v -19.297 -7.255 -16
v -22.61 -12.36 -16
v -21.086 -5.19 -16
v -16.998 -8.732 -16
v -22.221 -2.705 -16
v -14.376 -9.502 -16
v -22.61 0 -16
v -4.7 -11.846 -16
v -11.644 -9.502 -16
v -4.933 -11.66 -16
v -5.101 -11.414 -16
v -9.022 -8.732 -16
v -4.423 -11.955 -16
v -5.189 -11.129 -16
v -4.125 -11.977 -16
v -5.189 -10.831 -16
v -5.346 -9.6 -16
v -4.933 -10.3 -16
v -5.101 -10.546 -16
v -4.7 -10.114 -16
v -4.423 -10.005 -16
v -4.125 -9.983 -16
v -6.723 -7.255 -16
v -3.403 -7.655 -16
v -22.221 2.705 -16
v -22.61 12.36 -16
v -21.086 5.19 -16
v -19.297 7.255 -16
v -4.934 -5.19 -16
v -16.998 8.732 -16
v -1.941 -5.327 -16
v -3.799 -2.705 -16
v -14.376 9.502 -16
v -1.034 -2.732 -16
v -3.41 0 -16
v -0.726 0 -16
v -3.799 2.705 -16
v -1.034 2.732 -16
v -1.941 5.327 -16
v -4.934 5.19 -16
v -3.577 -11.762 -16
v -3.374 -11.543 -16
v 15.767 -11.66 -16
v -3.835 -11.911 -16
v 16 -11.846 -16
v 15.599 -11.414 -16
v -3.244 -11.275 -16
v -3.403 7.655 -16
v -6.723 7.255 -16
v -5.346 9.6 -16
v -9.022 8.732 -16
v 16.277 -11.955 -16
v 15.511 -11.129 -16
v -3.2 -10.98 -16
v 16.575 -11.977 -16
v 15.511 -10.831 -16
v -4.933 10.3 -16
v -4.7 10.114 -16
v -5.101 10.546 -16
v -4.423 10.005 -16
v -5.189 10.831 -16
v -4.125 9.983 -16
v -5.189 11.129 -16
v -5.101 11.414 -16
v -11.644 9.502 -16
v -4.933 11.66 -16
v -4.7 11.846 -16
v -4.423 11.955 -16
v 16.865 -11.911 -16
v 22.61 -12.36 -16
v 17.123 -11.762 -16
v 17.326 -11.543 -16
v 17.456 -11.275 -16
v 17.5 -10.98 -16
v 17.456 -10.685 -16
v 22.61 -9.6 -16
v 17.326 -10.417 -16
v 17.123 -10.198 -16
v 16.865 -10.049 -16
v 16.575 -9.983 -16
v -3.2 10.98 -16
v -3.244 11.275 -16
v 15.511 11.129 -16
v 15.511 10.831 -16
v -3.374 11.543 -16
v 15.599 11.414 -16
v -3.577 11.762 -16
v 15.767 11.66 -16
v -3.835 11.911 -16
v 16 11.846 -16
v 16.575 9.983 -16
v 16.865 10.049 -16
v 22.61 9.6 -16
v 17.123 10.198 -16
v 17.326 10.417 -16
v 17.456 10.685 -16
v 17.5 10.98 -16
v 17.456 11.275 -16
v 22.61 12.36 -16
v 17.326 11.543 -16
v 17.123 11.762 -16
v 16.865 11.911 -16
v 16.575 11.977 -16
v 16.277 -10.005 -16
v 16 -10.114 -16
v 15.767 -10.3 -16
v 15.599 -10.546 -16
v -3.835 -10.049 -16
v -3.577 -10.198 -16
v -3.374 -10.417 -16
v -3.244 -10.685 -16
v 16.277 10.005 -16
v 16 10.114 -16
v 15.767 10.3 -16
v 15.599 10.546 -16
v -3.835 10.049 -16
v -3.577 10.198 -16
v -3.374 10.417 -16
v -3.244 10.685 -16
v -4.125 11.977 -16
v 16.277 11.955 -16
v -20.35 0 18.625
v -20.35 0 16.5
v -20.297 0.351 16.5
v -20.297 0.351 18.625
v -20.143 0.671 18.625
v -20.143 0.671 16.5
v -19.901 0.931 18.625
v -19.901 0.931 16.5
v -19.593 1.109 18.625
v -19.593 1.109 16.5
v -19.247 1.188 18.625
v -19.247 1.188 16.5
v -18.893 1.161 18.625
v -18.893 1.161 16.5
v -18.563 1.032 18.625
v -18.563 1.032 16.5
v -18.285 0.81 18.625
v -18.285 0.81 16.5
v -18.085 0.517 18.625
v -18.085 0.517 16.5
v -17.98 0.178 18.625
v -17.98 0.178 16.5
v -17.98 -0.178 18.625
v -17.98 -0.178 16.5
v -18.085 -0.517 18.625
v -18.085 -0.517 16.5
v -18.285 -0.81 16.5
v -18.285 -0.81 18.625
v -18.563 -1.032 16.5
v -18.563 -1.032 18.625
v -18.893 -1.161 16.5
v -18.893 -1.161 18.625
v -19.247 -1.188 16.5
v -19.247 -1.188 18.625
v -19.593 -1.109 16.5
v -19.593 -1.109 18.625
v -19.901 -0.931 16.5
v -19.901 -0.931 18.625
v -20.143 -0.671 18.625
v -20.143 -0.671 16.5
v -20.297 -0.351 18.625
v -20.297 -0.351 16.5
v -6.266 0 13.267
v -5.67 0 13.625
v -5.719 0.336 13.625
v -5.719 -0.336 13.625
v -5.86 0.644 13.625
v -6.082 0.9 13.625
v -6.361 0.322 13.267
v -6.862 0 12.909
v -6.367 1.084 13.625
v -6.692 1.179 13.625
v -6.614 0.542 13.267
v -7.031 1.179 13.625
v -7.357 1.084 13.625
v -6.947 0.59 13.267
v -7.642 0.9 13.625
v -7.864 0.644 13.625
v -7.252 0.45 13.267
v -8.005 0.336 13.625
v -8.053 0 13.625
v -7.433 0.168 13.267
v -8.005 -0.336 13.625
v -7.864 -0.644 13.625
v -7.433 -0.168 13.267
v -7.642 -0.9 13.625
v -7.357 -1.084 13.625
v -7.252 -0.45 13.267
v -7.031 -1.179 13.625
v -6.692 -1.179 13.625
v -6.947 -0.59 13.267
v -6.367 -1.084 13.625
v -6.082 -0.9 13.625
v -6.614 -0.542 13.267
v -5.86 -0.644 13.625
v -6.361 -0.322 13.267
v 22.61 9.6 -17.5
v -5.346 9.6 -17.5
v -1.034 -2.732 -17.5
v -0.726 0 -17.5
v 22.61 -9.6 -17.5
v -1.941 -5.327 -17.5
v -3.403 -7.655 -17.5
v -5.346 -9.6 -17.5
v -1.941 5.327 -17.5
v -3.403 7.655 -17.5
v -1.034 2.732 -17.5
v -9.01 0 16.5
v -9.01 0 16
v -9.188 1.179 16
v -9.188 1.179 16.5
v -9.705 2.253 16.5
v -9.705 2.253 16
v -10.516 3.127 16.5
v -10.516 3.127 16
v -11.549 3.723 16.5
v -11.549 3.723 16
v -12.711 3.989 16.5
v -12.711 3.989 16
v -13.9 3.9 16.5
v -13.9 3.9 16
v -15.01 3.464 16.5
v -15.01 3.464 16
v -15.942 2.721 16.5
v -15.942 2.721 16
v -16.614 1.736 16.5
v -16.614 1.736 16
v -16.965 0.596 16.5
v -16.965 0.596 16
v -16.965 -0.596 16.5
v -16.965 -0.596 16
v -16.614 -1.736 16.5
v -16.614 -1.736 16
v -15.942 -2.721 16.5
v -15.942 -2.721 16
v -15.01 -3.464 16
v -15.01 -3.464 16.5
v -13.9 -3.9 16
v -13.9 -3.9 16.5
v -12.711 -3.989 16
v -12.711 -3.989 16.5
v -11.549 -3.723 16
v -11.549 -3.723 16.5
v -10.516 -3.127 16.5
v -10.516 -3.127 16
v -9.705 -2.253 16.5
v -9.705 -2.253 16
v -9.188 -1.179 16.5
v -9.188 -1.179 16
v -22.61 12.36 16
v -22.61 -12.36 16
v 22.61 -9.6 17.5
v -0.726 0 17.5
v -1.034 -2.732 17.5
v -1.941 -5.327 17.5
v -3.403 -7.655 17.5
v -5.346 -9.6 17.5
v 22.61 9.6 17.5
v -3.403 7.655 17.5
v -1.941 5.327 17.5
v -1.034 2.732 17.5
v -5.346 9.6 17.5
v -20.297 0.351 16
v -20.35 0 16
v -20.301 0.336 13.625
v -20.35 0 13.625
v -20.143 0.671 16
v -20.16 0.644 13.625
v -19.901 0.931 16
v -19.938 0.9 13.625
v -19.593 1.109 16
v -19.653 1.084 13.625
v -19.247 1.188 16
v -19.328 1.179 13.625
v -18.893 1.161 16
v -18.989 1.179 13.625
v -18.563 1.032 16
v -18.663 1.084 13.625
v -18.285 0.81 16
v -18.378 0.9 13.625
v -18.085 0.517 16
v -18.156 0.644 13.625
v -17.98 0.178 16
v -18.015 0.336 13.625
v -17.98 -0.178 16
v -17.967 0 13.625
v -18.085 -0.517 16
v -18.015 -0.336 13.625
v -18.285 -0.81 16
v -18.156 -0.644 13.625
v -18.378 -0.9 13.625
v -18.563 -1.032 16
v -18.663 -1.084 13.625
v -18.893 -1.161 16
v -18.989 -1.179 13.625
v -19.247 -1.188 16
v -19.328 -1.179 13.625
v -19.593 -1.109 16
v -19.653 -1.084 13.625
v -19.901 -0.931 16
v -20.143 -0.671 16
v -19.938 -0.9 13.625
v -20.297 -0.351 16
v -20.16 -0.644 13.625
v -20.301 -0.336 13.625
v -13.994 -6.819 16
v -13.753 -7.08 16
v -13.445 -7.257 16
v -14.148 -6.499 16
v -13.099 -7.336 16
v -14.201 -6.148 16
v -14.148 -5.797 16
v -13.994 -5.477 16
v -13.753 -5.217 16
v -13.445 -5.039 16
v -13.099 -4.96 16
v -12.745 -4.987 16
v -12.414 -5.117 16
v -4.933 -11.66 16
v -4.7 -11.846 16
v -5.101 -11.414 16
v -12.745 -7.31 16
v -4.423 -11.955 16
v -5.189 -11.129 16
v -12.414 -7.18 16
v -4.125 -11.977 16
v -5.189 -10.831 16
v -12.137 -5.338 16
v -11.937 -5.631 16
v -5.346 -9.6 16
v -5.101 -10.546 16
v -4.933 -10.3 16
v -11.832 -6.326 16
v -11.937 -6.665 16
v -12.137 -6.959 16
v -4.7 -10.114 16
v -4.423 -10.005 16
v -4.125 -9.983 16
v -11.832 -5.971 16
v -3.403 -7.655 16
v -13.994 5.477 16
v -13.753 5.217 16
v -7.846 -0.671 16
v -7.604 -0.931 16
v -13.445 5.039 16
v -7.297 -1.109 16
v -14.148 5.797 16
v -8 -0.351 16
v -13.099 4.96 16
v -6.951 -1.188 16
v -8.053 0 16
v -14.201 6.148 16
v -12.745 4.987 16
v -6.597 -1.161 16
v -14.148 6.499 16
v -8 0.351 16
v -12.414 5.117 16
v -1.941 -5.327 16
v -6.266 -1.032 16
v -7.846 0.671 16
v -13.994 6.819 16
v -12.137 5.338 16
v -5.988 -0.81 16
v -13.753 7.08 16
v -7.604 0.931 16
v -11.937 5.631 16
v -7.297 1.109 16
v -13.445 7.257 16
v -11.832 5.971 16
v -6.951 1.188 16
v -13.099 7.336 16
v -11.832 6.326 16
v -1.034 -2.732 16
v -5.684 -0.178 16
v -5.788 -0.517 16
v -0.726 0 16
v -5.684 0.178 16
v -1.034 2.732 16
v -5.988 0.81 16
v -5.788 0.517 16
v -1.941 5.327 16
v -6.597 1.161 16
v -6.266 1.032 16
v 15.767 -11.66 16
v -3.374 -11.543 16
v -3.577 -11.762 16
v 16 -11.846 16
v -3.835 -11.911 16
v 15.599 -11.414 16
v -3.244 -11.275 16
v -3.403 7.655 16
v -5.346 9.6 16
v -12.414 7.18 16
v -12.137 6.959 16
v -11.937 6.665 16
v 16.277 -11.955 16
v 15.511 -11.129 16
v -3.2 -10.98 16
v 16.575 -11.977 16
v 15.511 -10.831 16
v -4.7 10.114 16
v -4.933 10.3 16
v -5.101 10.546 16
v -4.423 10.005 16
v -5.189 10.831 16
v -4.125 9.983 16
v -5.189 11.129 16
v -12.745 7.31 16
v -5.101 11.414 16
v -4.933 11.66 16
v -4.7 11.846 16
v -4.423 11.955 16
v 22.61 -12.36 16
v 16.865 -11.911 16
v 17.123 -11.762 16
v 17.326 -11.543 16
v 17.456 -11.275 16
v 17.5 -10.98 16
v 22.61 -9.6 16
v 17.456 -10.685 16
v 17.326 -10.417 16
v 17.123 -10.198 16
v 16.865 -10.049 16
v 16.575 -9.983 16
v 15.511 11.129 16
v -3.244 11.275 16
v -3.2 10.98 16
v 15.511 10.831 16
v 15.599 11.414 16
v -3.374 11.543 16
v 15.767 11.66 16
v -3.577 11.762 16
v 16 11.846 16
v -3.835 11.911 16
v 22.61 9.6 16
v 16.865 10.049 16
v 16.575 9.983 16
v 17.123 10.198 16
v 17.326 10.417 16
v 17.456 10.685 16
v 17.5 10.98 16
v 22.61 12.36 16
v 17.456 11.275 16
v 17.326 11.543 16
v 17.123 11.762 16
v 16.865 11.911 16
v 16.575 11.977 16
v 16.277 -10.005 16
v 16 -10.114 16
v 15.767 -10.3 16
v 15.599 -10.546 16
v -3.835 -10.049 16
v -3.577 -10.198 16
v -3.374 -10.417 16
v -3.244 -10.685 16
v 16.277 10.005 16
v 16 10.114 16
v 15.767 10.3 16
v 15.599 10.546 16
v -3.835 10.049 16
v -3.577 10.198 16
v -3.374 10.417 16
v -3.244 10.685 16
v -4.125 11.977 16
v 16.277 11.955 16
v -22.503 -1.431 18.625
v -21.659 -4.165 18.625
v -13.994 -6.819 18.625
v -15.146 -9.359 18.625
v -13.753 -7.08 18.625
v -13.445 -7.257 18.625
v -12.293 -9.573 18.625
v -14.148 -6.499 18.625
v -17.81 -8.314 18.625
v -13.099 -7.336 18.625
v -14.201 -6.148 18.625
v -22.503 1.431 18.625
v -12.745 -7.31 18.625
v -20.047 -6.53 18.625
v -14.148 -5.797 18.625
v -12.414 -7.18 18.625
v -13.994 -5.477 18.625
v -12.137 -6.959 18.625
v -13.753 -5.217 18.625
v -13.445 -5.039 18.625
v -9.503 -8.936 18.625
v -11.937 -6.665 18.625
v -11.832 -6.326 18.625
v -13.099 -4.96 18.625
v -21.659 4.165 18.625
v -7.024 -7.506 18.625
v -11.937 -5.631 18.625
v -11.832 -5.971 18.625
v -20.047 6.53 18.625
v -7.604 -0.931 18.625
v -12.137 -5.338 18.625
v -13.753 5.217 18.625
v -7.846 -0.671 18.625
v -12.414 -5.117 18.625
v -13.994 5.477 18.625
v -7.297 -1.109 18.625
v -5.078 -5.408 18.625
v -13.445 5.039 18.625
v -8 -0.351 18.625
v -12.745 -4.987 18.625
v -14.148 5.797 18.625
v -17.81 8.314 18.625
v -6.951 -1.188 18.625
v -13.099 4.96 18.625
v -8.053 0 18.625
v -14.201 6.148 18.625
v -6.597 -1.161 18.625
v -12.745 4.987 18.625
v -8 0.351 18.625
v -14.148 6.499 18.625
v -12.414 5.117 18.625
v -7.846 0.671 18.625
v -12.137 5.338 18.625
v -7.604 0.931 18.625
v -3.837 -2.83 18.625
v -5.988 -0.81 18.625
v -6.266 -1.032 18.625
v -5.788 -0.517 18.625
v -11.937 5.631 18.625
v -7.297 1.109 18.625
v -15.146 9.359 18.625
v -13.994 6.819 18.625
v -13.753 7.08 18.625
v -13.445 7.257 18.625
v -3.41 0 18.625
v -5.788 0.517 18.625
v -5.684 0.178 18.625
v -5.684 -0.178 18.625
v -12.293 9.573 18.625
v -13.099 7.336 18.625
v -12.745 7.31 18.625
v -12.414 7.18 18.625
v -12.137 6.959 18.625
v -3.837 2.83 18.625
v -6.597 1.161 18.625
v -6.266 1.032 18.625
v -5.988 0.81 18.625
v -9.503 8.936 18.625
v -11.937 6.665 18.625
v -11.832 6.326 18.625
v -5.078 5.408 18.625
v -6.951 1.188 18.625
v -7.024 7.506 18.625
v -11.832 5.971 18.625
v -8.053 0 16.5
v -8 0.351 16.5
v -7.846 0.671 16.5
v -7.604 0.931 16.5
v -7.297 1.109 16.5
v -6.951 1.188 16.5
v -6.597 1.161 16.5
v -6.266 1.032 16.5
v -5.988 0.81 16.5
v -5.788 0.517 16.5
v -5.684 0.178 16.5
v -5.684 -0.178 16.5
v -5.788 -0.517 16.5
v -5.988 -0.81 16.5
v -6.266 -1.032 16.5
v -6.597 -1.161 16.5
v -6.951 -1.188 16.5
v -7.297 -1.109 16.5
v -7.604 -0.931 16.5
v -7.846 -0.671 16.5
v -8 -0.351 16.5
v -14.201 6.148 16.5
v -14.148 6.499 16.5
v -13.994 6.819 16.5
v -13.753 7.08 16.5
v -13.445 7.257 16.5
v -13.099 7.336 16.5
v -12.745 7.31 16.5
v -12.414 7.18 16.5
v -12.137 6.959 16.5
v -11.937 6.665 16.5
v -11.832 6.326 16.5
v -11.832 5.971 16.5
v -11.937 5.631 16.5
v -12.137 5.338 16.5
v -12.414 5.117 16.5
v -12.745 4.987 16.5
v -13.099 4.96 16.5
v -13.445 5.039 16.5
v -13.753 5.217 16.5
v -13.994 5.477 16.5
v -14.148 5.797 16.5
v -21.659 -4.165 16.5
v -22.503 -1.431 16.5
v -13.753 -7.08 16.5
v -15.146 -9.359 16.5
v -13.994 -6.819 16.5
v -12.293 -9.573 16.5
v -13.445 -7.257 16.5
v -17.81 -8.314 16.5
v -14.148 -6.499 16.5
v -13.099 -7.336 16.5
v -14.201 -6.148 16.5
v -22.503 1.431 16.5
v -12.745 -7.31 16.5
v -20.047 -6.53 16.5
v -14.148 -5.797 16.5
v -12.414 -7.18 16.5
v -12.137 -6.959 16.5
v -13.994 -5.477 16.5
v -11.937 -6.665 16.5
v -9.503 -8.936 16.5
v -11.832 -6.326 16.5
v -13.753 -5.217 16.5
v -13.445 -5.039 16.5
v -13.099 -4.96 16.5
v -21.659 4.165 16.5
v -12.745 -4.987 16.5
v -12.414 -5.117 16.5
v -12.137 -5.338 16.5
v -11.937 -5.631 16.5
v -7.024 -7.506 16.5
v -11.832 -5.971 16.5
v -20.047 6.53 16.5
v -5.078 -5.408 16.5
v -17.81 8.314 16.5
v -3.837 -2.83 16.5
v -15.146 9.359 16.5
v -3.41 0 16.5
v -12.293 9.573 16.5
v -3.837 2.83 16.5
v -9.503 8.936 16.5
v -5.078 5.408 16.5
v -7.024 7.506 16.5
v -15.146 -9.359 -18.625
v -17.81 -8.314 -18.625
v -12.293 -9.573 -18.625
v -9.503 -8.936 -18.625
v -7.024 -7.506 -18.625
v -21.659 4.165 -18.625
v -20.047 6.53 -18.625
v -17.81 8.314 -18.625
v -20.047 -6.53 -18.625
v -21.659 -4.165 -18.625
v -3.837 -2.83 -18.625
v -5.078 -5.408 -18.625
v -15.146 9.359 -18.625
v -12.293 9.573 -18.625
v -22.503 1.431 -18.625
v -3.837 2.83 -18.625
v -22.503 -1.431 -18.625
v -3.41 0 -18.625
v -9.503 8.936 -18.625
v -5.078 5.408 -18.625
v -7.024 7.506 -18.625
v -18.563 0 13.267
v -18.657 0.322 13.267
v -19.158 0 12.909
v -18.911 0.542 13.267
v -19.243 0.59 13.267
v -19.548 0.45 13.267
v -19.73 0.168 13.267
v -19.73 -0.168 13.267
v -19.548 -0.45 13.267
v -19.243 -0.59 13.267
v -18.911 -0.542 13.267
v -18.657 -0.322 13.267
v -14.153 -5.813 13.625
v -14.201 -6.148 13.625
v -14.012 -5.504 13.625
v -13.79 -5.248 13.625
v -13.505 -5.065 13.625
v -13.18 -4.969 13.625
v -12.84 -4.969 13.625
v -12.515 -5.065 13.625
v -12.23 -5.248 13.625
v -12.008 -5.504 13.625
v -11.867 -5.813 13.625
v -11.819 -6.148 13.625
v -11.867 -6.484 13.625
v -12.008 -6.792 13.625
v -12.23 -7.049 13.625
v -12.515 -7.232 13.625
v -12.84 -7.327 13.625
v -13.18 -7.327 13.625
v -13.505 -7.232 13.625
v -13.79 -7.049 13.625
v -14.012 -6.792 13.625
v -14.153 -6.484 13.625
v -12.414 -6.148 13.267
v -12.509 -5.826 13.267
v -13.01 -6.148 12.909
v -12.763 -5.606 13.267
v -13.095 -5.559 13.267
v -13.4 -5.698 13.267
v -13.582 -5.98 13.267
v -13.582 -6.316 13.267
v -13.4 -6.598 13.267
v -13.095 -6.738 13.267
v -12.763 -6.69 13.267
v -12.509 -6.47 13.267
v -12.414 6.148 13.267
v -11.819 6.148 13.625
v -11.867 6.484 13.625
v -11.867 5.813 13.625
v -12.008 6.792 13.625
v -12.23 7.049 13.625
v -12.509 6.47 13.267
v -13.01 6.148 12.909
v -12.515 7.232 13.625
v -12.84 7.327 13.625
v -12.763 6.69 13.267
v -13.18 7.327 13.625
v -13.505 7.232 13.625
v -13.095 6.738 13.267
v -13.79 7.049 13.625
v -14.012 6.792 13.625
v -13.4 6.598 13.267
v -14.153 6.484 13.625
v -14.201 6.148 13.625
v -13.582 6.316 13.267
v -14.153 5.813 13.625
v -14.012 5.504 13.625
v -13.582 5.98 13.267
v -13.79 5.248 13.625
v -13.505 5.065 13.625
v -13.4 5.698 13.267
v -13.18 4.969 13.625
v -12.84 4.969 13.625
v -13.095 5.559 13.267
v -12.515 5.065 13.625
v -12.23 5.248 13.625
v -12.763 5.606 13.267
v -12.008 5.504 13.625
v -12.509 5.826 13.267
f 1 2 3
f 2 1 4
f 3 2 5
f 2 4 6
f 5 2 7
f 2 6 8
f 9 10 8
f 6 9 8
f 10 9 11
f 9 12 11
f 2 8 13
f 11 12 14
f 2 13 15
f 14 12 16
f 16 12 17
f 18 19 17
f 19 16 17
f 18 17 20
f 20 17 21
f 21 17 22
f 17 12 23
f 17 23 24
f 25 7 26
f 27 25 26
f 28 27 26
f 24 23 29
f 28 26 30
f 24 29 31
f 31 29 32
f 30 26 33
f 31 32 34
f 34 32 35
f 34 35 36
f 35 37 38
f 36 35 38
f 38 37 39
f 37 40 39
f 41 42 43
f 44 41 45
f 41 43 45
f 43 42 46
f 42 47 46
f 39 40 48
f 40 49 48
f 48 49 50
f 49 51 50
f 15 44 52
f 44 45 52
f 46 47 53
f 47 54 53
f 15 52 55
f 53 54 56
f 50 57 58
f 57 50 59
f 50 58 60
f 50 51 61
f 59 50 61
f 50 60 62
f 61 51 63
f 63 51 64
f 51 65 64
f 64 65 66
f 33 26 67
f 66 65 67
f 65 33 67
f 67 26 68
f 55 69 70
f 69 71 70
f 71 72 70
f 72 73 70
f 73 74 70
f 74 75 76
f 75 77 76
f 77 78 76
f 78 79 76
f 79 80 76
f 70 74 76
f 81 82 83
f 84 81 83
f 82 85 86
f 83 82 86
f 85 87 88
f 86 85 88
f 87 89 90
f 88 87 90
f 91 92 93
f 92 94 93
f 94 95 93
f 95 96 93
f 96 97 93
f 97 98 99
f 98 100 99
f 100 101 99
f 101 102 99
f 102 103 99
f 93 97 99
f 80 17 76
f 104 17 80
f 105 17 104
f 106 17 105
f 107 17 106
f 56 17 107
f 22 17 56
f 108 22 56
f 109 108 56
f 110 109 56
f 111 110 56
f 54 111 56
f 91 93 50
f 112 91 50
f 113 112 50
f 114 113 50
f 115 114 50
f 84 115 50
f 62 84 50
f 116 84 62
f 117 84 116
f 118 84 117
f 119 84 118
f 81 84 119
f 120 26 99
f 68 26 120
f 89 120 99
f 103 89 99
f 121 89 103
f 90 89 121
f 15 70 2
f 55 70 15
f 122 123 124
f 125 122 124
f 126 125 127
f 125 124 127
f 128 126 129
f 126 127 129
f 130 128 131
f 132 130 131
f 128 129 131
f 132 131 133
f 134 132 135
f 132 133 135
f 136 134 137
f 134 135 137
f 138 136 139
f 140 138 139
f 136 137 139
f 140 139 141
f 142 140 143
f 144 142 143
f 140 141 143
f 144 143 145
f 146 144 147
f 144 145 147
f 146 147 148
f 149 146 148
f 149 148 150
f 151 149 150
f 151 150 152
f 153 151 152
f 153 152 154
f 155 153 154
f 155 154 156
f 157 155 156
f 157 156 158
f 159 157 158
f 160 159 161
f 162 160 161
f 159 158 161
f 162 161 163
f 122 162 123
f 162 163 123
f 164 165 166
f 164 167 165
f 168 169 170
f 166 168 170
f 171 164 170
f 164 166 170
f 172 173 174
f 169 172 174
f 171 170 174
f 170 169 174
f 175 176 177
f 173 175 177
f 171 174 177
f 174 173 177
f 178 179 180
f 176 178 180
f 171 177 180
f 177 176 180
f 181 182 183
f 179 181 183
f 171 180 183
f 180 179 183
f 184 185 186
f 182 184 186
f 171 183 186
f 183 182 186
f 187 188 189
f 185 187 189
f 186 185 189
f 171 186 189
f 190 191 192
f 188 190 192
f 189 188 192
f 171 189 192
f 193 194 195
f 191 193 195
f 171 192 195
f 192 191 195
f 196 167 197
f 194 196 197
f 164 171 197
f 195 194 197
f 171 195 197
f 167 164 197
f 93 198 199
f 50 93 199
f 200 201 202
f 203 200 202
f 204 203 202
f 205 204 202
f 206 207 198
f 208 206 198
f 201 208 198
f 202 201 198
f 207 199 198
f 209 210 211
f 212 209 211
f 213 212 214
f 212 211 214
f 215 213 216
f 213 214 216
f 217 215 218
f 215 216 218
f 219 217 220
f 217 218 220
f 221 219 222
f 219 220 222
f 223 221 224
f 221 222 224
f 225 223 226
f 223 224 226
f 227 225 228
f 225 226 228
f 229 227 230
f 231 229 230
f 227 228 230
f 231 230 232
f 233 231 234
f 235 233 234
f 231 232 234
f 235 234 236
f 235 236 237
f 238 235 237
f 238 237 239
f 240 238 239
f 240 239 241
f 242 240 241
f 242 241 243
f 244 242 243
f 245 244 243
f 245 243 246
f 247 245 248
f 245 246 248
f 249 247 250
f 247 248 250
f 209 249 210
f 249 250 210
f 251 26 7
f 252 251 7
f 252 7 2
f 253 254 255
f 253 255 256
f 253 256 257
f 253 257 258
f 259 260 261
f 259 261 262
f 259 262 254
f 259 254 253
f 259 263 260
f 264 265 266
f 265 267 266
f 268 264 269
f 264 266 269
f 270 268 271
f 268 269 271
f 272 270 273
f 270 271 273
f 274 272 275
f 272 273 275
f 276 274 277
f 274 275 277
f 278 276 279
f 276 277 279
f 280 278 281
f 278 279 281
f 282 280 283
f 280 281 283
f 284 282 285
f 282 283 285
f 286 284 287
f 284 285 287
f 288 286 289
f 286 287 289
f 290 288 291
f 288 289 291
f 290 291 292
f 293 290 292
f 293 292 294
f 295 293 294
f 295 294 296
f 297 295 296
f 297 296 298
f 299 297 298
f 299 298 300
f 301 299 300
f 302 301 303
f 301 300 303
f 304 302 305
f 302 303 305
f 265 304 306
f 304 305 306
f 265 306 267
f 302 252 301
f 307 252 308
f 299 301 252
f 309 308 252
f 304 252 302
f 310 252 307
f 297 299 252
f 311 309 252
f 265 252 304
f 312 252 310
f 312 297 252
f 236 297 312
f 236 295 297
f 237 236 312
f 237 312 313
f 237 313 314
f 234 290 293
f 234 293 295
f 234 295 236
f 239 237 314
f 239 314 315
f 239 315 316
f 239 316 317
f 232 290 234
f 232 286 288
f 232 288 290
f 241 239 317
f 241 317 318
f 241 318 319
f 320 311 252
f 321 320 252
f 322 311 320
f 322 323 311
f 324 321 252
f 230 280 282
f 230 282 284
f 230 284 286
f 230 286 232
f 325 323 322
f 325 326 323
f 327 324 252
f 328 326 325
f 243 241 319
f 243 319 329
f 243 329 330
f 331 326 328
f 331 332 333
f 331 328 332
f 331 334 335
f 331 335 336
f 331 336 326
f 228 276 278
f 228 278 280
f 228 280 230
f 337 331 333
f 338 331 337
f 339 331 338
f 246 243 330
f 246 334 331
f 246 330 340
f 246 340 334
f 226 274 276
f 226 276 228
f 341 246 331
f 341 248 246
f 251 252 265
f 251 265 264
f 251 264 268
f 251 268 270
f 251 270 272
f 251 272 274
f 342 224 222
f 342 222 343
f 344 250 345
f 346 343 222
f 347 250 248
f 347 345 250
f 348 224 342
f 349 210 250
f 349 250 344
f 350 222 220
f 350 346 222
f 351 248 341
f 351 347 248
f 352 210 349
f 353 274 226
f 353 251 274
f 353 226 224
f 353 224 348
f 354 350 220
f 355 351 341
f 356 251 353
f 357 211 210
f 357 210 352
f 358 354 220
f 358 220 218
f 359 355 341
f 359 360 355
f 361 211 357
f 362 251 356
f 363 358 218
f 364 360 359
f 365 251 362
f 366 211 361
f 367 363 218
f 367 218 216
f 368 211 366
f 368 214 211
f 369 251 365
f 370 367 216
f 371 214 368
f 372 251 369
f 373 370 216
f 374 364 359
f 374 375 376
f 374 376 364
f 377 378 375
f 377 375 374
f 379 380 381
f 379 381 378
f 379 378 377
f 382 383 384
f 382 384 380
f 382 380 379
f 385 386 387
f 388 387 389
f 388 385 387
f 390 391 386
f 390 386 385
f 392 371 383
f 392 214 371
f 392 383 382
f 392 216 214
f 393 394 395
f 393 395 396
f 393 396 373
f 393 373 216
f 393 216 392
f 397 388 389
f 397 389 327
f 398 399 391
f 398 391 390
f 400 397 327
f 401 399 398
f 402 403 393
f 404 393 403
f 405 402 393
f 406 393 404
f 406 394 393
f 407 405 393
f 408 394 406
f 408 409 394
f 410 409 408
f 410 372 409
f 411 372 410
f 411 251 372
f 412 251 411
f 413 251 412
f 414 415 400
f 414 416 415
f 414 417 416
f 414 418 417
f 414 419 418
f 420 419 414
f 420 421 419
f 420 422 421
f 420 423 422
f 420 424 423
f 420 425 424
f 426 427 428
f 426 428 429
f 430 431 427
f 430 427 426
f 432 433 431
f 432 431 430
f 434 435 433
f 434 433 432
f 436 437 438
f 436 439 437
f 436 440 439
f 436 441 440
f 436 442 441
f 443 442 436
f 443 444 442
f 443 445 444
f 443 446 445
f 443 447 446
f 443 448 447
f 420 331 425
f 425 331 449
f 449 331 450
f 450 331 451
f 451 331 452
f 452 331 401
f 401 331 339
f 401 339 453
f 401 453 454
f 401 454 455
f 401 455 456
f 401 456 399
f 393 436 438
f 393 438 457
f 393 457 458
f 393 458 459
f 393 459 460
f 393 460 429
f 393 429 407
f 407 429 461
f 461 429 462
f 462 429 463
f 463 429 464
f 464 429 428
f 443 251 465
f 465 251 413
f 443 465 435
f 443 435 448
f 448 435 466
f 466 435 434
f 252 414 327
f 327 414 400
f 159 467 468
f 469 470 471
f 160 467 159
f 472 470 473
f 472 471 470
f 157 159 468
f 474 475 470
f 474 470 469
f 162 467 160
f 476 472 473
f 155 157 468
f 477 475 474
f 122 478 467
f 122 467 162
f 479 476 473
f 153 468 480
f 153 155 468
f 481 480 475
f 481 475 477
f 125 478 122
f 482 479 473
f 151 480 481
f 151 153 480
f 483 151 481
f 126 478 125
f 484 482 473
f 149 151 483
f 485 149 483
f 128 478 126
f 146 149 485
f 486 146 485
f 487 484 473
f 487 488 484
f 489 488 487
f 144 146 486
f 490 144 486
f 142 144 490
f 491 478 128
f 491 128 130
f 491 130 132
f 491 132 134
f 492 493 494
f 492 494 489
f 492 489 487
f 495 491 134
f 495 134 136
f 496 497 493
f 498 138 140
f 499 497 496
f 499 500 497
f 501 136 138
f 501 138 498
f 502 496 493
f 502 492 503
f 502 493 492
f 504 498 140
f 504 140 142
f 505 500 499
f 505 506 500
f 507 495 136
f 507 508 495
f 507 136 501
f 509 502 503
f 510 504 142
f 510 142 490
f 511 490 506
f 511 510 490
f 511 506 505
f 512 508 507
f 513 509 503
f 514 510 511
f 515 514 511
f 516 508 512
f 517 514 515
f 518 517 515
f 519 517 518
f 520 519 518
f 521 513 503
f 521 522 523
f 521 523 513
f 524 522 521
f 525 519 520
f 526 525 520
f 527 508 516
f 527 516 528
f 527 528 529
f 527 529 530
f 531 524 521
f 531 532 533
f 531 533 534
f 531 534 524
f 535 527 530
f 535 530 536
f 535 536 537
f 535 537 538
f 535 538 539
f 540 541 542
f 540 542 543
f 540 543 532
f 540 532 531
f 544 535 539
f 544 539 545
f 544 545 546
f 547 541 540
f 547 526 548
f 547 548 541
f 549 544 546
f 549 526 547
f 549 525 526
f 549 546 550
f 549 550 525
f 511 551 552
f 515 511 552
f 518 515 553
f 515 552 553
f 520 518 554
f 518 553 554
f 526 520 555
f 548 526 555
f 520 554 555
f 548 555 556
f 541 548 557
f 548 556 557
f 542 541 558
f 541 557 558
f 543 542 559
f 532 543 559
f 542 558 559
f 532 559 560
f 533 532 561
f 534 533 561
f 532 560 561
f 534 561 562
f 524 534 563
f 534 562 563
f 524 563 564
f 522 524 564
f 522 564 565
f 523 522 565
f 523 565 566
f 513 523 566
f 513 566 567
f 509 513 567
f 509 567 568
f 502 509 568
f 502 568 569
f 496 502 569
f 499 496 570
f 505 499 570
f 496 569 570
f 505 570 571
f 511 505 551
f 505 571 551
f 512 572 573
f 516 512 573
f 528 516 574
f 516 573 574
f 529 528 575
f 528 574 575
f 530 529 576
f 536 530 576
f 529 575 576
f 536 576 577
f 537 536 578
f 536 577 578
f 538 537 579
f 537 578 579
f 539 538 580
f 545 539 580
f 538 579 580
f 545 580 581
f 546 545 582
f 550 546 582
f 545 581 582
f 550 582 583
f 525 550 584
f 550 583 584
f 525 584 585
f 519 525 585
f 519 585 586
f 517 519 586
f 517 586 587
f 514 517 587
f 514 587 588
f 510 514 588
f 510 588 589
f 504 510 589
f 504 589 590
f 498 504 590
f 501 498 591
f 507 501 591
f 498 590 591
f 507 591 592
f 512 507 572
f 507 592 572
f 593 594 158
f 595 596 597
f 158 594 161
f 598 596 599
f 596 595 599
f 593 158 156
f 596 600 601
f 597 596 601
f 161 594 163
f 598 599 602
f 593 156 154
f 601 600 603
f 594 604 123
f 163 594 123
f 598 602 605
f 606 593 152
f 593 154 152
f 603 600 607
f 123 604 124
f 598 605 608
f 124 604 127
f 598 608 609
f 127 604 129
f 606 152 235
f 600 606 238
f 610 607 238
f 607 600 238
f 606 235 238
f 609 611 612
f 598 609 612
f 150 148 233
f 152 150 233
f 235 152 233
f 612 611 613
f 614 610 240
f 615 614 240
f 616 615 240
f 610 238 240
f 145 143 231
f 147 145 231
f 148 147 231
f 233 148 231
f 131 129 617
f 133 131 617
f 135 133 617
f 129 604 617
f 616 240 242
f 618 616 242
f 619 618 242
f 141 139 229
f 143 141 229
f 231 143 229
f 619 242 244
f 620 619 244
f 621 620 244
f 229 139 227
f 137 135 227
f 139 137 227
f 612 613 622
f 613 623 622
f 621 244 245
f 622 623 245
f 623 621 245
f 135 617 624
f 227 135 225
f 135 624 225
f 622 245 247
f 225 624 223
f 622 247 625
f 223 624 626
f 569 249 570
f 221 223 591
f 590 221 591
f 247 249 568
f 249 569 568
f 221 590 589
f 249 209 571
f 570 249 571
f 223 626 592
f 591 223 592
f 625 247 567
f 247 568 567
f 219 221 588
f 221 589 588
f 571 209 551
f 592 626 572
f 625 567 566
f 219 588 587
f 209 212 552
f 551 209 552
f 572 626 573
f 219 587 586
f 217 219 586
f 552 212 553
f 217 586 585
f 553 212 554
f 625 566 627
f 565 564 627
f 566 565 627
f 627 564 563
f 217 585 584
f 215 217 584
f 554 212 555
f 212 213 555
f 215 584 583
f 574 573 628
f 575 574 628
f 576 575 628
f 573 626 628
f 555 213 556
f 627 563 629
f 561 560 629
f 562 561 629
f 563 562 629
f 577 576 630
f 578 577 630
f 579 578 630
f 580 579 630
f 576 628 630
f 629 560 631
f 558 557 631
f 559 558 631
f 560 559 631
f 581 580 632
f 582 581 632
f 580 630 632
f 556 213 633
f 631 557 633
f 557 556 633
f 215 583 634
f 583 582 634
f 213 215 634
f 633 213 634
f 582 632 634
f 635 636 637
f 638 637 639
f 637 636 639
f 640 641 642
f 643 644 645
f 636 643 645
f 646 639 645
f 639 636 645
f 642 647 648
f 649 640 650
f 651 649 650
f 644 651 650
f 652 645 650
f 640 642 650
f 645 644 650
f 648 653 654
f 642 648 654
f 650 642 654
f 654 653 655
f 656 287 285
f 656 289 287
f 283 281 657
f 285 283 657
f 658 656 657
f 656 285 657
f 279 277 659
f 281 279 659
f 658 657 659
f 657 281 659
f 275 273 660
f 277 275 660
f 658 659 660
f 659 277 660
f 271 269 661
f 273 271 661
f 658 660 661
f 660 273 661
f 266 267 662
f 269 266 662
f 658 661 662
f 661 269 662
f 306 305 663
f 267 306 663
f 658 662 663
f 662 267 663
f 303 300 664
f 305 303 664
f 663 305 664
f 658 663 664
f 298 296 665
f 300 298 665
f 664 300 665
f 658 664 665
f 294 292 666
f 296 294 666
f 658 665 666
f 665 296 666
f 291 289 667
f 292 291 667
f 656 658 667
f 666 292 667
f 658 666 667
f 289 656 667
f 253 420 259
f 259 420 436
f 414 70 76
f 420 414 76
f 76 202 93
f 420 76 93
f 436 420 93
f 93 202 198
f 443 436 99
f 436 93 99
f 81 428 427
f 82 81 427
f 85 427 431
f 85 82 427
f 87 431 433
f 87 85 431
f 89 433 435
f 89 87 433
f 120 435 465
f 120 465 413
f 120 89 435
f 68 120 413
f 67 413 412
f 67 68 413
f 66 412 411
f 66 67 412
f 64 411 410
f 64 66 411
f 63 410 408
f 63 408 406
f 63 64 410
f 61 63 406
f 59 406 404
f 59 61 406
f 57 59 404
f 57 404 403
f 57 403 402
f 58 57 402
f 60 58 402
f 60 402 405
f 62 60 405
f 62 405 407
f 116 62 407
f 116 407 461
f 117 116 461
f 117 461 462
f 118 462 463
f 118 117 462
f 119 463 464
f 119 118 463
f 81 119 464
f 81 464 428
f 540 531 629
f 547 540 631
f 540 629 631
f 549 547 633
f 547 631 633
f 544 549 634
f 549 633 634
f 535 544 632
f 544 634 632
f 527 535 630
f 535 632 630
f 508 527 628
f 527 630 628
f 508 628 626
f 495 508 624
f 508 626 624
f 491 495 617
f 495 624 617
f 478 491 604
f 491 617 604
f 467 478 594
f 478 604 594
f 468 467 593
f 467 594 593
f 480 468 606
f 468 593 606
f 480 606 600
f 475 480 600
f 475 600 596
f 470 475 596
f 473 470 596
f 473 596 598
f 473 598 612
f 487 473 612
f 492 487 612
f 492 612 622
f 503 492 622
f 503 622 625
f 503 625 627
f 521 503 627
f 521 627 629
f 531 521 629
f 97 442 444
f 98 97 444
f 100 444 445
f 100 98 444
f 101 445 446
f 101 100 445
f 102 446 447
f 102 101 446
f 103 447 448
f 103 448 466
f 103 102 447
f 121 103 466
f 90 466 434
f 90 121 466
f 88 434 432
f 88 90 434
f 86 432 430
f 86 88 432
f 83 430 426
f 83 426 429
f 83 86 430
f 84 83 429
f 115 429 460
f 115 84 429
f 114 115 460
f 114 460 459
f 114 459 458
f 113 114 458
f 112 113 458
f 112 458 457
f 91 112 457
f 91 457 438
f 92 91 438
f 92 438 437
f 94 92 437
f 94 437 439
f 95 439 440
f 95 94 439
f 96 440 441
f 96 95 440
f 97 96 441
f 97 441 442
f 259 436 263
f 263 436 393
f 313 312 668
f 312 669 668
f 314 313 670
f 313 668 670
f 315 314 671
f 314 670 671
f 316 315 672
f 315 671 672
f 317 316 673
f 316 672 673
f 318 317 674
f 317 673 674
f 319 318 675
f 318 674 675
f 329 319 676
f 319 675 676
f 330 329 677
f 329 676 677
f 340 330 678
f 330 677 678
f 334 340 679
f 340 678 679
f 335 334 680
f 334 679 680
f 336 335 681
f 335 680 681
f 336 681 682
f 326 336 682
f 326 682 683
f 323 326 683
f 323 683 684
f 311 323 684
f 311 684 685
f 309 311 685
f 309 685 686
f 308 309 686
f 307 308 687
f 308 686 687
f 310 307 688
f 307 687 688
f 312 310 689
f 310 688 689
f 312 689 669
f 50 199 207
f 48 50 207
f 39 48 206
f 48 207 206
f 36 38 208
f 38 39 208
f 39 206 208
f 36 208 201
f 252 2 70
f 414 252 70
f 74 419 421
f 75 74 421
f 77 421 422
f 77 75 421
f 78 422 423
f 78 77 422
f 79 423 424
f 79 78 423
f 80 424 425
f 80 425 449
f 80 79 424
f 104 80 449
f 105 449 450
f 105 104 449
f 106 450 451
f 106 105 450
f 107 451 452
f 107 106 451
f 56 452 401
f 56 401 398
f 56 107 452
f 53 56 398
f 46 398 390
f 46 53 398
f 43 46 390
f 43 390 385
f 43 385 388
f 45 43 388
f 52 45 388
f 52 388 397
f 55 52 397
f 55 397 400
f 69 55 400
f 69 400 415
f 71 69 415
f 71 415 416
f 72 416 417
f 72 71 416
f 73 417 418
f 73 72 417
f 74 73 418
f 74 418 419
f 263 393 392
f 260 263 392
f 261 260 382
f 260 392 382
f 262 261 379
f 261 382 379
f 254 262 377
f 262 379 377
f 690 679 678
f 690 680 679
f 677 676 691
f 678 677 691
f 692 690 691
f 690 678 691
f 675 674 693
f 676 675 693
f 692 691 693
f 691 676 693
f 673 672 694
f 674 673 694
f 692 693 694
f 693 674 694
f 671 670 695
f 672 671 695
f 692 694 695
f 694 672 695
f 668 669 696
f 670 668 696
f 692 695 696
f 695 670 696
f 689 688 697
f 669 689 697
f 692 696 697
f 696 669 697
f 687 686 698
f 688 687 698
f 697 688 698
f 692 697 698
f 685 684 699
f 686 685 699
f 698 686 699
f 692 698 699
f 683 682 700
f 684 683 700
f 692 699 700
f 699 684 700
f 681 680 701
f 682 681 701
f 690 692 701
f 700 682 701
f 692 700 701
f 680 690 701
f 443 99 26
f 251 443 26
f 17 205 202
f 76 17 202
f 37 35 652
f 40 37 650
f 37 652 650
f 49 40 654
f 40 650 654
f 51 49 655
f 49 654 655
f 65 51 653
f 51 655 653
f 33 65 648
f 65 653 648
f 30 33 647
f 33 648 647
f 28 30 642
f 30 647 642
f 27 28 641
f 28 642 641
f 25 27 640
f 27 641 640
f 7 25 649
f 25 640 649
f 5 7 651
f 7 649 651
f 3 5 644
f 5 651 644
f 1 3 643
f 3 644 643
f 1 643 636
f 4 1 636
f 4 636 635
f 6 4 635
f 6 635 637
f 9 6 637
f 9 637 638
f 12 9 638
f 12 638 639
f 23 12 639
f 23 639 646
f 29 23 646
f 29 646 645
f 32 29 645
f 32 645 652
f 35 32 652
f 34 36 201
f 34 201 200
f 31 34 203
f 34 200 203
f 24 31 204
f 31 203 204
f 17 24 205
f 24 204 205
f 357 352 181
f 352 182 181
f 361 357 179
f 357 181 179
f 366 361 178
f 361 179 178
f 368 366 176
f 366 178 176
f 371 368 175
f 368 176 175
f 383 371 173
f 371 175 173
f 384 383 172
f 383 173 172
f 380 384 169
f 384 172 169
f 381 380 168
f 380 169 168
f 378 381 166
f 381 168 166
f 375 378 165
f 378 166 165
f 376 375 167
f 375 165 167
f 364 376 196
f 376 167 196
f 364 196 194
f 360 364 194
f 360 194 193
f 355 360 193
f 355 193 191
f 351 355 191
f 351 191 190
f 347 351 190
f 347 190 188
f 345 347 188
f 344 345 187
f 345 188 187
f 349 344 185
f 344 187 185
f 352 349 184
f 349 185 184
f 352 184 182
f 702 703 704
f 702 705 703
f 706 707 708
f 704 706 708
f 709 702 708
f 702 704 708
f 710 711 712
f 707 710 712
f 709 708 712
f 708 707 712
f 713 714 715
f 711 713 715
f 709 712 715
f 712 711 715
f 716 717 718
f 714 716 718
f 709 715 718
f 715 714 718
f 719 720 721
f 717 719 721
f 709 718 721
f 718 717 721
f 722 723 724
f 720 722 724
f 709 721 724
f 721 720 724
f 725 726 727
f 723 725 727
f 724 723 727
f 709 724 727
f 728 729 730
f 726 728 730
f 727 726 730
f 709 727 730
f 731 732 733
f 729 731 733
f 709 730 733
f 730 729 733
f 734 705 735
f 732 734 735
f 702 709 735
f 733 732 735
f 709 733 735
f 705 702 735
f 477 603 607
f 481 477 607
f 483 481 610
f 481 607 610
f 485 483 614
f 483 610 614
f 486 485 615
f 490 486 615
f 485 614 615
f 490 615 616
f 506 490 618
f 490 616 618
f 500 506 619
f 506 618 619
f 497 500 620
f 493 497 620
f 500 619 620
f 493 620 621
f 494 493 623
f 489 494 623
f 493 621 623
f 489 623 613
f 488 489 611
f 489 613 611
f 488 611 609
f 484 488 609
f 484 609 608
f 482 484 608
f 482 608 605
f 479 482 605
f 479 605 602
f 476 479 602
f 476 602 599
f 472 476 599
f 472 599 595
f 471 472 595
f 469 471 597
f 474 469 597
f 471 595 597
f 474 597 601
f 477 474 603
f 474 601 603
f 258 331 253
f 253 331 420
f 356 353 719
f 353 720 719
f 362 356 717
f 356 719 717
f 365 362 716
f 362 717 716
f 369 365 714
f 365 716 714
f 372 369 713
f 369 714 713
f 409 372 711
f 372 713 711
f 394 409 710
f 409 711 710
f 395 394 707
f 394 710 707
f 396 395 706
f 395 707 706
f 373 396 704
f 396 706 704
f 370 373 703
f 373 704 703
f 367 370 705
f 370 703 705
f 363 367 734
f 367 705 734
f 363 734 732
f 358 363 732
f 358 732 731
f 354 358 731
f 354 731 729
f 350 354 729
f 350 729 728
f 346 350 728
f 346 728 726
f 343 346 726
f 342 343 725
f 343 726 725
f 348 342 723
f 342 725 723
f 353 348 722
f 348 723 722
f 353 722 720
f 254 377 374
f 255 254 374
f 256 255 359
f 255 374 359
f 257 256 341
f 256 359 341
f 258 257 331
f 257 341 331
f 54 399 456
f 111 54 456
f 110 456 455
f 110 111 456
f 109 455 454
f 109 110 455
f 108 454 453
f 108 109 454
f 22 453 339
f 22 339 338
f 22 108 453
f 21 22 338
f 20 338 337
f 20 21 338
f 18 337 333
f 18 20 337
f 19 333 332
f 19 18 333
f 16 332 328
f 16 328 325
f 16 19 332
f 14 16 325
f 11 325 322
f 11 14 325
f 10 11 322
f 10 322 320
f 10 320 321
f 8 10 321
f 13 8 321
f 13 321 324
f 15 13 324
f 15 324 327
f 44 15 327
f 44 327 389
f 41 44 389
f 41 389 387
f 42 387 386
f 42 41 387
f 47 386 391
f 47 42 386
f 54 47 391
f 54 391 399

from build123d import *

# Parameters (mm, degrees)
BOSS_EXTRUDE1_DEPTH             = 17.5
BOSS_EXTRUDE1_DEPTH_BACK        = 17.5
BOSS_EXTRUDE2_DEPTH             = 16
BOSS_EXTRUDE2_DEPTH_BACK        = 16
SKETCH1_3_R                     = 1
SKETCH1_3_W                     = 27.956190476
SKETCH1_3_H                     = 2.76
BOSS_EXTRUDE3_DEPTH             = 18.625
BOSS_EXTRUDE3_DEPTH_BACK        = 18.625
TAP_DRILL_FOR_2_HELICOIL1_D     = 2.38252
TAP_DRILL_FOR_2_HELICOIL1_DEPTH = 5
TAP_DRILL_FOR_2_HELICOIL1_TIP   = 0.715781221
SKETCH6_R                       = 9.6
SKETCH6_R_2                     = 4
CUT_EXTRUDE1_DEPTH              = 0.5


with BuildPart() as part:
    # Sketch1 → Boss-Extrude1 (new, two sides: drawn at the far end of the back side and taken through both)
    with BuildSketch(Plane.XY.offset(-BOSS_EXTRUDE1_DEPTH_BACK)):
        with BuildLine():
            Line((22.61, 0), (-0.726109068, 0))
            ThreePointArc((-0.726109068, 0), (-1.941229139, -5.326939839), (-5.346190476, -9.6))
            Line((-5.346190476, -9.6), (22.61, -9.6))
            Line((22.61, -9.6), (22.61, 0))
        make_face()
        with BuildLine():
            Line((22.61, 9.6), (-5.346190476, 9.6))
            ThreePointArc((-5.346190476, 9.6), (-1.941229139, 5.326939839), (-0.726109068, 0))
            Line((-0.726109068, 0), (22.61, 0))
            Line((22.61, 0), (22.61, 9.6))
        make_face()
    extrude(amount=BOSS_EXTRUDE1_DEPTH + BOSS_EXTRUDE1_DEPTH_BACK)

    # Sketch1<3> → Boss-Extrude2 (add, two sides: drawn at the far end of the back side and taken through both)
    # profile 1 of 7: a face of its own
    with BuildSketch(Plane.XY.offset(-BOSS_EXTRUDE2_DEPTH_BACK)):
        with BuildLine():
            ThreePointArc((-5.346190476, -9.6), (-1.941229139, -5.326939839), (-0.726109068, 0))
            Line((-0.726109068, 0), (-3.41, 0))
            ThreePointArc((-3.41, 0), (-13.01, -9.6), (-22.61, 0))
            Line((-22.61, 0), (-22.61, -12.36))
            Line((-22.61, -12.36), (-5.346190476, -12.36))
            Line((-5.346190476, -12.36), (-5.346190476, -9.6))
        make_face()
    # profile 2 of 7: a face of its own
    with BuildSketch(Plane.XY.offset(-BOSS_EXTRUDE2_DEPTH_BACK)):
        with BuildLine():
            ThreePointArc((-22.61, 0), (-13.01, -9.6), (-3.41, 0))
            Line((-3.41, 0), (-22.61, 0))
        make_face()
    # profile 3 of 7: a face of its own
    with BuildSketch(Plane.XY.offset(-BOSS_EXTRUDE2_DEPTH_BACK)):
        with BuildLine():
            Line((-22.61, 0), (-3.41, 0))
            ThreePointArc((-3.41, 0), (-13.01, 9.6), (-22.61, 0))
        make_face()
    # profile 4 of 7: a face of its own
    with BuildSketch(Plane.XY.offset(-BOSS_EXTRUDE2_DEPTH_BACK)):
        with BuildLine():
            ThreePointArc((-22.61, 0), (-13.01, -9.6), (-3.41, 0))
            Line((-3.41, 0), (-22.61, 0))
        make_face()
    # profile 5 of 7: a face of its own
    with BuildSketch(Plane.XY.offset(-BOSS_EXTRUDE2_DEPTH_BACK)):
        with BuildLine():
            Line((-22.61, 0), (-3.41, 0))
            ThreePointArc((-3.41, 0), (-13.01, 9.6), (-22.61, 0))
        make_face()
    # profile 6 of 7: a face of its own
    with BuildSketch(Plane.XY.offset(-BOSS_EXTRUDE2_DEPTH_BACK)):
        with BuildLine():
            ThreePointArc((-0.726109068, 0), (-1.941229139, 5.326939839), (-5.346190476, 9.6))
            Line((-5.346190476, 9.6), (22.61, 9.6))
            Line((22.61, 9.6), (22.61, 12.36))
            Line((22.61, 12.36), (-22.61, 12.36))
            Line((-22.61, 12.36), (-22.61, 0))
            ThreePointArc((-22.61, 0), (-13.01, 9.6), (-3.41, 0))
            Line((-3.41, 0), (-0.726109068, 0))
        make_face()
        with Locations((-4.2, 10.98)):
            Circle(SKETCH1_3_R, mode=Mode.SUBTRACT)
        with Locations((16.5, 10.98)):
            Circle(SKETCH1_3_R, mode=Mode.SUBTRACT)
    # profile 7 of 7: a face of its own
    with BuildSketch(Plane.XY.offset(-BOSS_EXTRUDE2_DEPTH_BACK)):
        with Locations((8.631904762, -10.98)):
            Rectangle(SKETCH1_3_W, SKETCH1_3_H)
        with Locations((-4.2, -10.98)):
            Circle(SKETCH1_3_R, mode=Mode.SUBTRACT)
        with Locations((16.5, -10.98)):
            Circle(SKETCH1_3_R, mode=Mode.SUBTRACT)
    extrude(amount=BOSS_EXTRUDE2_DEPTH + BOSS_EXTRUDE2_DEPTH_BACK)

    # Sketch1<4> → Boss-Extrude3 (add, two sides: drawn at the far end of the back side and taken through both)
    with BuildSketch(Plane.XY.offset(-BOSS_EXTRUDE3_DEPTH_BACK)):
        with BuildLine():
            ThreePointArc((-22.61, 0), (-13.01, -9.6), (-3.41, 0))
            Line((-3.41, 0), (-22.61, 0))
        make_face()
        with BuildLine():
            Line((-22.61, 0), (-3.41, 0))
            ThreePointArc((-3.41, 0), (-13.01, 9.6), (-22.61, 0))
        make_face()
    extrude(amount=BOSS_EXTRUDE3_DEPTH + BOSS_EXTRUDE3_DEPTH_BACK)

    # Tap Drill for #2 Helicoil1
    with Locations(Plane.XY.offset(18.625)):
        with Locations((-13.01, 6.148263222), (-6.861736778, 0), (-13.01, -6.148263222), (-19.158263222, 0)):
            Hole(TAP_DRILL_FOR_2_HELICOIL1_D / 2, depth=TAP_DRILL_FOR_2_HELICOIL1_DEPTH)
            with Locations((0, 0, -(TAP_DRILL_FOR_2_HELICOIL1_DEPTH + TAP_DRILL_FOR_2_HELICOIL1_TIP / 2))):  # 118° drill point
                Cone(0, TAP_DRILL_FOR_2_HELICOIL1_D / 2, TAP_DRILL_FOR_2_HELICOIL1_TIP, mode=Mode.SUBTRACT)

    # Sketch6 → Cut-Extrude1 (cut)
    with BuildSketch(Plane.XY.offset(16)):
        with Locations((-13.01, 0)):
            Circle(SKETCH6_R)
        with Locations((-13.01, 0)):
            Circle(SKETCH6_R_2, mode=Mode.SUBTRACT)
    extrude(amount=CUT_EXTRUDE1_DEPTH, mode=Mode.SUBTRACT)


solid = part.part
